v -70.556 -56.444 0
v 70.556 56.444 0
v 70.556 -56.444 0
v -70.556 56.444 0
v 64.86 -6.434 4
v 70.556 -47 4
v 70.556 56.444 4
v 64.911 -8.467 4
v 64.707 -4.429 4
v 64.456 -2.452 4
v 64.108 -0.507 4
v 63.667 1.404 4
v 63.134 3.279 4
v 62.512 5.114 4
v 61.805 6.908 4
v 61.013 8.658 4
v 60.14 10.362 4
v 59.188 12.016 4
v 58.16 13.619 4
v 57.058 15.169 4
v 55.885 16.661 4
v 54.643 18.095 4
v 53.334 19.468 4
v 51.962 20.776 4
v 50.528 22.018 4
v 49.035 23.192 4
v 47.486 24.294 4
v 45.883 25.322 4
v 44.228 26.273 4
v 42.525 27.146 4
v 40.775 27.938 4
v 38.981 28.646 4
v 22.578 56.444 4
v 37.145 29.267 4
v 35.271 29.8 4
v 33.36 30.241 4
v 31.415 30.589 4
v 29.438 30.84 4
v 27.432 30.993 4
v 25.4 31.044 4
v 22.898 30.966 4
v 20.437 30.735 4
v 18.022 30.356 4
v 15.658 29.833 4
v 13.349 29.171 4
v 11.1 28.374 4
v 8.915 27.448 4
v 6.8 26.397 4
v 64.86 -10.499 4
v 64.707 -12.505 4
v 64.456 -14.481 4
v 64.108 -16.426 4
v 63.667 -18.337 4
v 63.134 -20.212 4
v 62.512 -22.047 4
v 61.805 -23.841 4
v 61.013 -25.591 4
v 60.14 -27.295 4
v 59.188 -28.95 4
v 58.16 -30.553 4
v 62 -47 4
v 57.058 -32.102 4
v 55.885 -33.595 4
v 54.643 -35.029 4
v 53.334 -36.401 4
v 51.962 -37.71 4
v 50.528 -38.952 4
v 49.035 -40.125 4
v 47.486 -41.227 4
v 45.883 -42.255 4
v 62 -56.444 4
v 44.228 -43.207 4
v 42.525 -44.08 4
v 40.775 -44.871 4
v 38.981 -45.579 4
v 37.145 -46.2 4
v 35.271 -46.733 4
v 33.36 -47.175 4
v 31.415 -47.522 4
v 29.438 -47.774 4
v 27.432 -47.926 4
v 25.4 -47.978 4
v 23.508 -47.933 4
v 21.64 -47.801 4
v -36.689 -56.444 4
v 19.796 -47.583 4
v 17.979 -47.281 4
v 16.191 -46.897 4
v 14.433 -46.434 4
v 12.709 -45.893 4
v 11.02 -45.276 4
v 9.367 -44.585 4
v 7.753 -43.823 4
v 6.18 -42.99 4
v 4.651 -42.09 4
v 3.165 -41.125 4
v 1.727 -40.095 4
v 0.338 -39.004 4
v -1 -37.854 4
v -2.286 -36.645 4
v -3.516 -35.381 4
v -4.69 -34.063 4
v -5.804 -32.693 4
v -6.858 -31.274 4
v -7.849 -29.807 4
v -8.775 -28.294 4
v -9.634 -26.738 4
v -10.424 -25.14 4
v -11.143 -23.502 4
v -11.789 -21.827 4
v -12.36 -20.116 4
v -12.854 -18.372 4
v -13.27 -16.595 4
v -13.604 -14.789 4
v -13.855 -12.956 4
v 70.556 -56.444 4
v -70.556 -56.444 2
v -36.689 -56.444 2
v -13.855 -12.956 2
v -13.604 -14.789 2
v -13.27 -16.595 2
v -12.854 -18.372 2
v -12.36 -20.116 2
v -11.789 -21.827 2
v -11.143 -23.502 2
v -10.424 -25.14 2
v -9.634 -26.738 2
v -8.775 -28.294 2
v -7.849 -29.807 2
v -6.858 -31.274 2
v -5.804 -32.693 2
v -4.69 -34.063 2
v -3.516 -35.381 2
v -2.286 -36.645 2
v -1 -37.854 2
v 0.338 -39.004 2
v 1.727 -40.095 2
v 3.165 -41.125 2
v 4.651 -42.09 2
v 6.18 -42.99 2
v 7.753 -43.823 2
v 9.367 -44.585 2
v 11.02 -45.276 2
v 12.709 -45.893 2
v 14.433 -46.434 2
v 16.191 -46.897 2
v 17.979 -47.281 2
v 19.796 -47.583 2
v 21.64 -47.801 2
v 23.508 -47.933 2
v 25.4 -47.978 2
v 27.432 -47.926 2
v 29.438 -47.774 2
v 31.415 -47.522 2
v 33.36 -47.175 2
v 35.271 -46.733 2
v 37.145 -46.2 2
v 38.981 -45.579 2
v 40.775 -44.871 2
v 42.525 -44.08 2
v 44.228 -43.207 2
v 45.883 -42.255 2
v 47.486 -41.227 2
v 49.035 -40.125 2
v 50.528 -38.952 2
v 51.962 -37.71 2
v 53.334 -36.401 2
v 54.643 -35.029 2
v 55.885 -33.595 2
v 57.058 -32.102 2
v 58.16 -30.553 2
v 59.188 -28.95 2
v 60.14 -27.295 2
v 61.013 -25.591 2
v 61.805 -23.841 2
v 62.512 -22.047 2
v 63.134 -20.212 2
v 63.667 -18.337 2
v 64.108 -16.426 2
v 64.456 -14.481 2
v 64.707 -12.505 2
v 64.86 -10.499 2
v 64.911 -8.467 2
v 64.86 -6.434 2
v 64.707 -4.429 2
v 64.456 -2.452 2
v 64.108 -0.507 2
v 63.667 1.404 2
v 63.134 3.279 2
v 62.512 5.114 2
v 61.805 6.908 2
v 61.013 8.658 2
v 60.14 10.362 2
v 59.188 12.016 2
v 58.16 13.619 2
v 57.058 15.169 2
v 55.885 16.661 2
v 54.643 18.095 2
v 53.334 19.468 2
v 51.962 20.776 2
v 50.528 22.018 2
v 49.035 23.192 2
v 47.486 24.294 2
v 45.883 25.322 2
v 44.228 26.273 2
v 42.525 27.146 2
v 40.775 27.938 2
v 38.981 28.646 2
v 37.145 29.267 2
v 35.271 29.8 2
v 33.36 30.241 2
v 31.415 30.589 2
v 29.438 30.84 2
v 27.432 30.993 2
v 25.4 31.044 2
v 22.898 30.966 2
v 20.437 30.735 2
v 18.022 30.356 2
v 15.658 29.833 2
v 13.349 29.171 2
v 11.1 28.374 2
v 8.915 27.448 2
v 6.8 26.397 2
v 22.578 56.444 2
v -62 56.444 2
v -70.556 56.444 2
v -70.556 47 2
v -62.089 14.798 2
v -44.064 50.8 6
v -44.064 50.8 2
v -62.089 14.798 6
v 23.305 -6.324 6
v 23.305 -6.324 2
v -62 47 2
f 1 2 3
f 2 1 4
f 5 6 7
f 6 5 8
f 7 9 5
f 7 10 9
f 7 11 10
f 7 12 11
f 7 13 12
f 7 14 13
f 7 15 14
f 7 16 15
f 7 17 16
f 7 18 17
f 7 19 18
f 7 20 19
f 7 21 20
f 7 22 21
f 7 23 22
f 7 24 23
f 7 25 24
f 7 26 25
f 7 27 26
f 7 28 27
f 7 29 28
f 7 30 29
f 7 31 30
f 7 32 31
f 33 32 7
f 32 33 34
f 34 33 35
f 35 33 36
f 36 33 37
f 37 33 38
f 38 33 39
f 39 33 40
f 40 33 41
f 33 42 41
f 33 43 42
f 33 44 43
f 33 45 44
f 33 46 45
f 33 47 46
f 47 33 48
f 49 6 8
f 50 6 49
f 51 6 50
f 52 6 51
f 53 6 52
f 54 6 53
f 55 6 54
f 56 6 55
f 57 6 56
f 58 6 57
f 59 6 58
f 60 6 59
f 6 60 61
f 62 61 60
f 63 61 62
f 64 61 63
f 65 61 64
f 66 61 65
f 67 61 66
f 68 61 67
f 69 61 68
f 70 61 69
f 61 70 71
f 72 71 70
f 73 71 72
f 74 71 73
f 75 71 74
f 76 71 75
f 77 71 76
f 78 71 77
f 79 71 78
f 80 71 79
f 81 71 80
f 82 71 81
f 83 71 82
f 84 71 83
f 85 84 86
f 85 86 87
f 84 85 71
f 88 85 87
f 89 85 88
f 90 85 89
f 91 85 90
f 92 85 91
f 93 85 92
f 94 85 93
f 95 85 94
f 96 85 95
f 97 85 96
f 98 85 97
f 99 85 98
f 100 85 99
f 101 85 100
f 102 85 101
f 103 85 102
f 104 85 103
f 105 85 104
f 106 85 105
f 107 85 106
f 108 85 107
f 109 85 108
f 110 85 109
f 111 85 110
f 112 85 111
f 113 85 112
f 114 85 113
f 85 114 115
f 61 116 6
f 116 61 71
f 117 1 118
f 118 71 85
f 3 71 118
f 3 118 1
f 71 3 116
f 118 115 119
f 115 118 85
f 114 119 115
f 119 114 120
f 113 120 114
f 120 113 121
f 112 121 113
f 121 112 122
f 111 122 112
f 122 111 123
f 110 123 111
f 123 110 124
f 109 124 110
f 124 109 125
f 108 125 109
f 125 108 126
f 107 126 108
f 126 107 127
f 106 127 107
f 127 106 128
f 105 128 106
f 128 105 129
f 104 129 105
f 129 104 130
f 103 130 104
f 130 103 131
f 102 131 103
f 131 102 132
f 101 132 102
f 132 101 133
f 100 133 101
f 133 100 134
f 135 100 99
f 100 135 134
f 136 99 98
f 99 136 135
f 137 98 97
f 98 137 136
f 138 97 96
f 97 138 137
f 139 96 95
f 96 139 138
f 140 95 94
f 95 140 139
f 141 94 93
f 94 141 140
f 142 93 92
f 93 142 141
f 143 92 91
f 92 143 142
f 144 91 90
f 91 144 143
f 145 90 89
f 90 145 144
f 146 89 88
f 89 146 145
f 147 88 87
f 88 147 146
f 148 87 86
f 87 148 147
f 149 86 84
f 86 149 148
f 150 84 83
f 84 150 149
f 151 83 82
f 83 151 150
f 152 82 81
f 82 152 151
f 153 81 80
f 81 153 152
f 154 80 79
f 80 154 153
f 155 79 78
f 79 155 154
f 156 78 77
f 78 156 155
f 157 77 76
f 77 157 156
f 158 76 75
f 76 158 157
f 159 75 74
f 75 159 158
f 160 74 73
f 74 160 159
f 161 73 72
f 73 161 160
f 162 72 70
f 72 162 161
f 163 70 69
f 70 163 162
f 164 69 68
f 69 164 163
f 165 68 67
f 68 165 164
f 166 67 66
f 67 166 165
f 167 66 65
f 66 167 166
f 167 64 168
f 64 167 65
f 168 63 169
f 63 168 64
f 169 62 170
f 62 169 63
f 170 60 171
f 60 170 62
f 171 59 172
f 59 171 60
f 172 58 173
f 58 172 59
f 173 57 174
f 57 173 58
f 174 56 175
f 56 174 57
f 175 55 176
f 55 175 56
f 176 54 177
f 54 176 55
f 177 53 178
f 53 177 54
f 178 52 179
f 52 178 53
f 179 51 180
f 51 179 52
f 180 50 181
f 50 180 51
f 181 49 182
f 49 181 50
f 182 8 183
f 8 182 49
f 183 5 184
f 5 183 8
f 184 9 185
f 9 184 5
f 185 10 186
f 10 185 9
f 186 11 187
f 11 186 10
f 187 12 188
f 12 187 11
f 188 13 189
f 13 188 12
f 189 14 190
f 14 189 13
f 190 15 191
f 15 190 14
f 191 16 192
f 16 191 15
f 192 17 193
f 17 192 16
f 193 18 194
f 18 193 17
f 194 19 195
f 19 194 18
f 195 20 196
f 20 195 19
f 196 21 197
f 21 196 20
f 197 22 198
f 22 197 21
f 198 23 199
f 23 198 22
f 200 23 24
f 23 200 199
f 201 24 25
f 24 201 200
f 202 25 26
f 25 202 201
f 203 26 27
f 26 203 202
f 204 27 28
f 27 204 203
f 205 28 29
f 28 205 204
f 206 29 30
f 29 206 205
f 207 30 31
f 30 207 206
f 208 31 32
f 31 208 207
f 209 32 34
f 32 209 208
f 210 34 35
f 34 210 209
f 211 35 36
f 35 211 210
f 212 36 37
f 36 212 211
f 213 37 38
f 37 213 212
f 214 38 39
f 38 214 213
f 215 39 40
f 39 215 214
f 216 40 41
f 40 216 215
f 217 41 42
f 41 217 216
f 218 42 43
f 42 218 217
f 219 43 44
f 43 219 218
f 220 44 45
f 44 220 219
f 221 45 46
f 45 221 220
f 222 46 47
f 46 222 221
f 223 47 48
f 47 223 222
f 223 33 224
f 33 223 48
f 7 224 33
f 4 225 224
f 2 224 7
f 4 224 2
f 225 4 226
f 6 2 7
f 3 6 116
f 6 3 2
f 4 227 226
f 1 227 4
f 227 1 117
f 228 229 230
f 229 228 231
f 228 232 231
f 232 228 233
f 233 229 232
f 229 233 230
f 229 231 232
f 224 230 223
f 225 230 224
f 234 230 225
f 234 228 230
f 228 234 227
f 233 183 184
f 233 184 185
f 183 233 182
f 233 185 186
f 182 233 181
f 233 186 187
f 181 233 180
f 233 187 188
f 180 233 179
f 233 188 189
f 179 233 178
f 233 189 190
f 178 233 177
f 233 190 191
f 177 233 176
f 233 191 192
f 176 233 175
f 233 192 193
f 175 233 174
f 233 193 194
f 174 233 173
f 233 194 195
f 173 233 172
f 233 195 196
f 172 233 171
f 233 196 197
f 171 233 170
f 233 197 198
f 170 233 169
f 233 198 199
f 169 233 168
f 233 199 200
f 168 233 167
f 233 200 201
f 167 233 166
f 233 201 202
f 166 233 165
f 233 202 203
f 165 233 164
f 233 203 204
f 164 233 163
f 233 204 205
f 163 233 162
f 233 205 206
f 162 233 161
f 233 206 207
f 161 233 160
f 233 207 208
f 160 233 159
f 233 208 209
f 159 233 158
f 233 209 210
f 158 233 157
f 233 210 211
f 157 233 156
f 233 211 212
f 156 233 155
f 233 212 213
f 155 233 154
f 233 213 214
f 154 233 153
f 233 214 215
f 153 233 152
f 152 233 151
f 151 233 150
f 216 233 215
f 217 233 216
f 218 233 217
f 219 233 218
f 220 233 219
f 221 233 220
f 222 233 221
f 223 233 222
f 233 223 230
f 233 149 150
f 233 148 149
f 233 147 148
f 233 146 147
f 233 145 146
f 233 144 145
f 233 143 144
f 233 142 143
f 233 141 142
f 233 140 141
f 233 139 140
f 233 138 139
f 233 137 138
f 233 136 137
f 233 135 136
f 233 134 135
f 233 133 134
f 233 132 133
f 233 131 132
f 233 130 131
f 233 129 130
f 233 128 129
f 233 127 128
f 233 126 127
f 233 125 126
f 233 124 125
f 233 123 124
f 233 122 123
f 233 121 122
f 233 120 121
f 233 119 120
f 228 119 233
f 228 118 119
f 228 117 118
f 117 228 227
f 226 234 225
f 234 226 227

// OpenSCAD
module base()
{
    
// Module names are of the form poly_<inkscape-path-id>().
// As a result you can associate a polygon in this OpenSCAD program with the
//  corresponding SVG element in the Inkscape document by looking for 
//  the XML element with the attribute id="inkscape-path-id".

// Paths have their own variables so they can be imported and used 
//  in polygon(points) structures in other programs.
// The NN_points is the list of all polygon XY vertices. 
// There may be an NN_paths variable as well. If it exists then it 
//  defines the nested paths. Both must be used in the 
//  polygon(points, paths) variant of the command.

profile_scale = 25.4/90; //made in inkscape in mm

// helper functions to determine the X,Y dimensions of the profiles
function min_x(shape_points) = min([ for (x = shape_points) min(x[0])]);
function max_x(shape_points) = max([ for (x = shape_points) max(x[0])]);
function min_y(shape_points) = min([ for (x = shape_points) min(x[1])]);
function max_y(shape_points) = max([ for (x = shape_points) max(x[1])]);

height = 2;
width = 1.0;


rect2162_0_points = [[-250.000000,-200.000000],[250.000000,-200.000000],[250.000000,200.000000],[-250.000000,200.000000],[-250.000000,-200.000000]];

module poly_rect2162(h, w, res=4)  {
  scale([profile_scale, -profile_scale, 1])
  union()  {
    linear_extrude(height=h)
      polygon(rect2162_0_points);
  }
}

// The shapes
poly_rect2162(height, width);
}



module right()
{
   

// Module names are of the form poly_<inkscape-path-id>().
// As a result you can associate a polygon in this OpenSCAD program with the
//  corresponding SVG element in the Inkscape document by looking for 
//  the XML element with the attribute id="inkscape-path-id".

// Paths have their own variables so they can be imported and used 
//  in polygon(points) structures in other programs.
// The NN_points is the list of all polygon XY vertices. 
// There may be an NN_paths variable as well. If it exists then it 
//  defines the nested paths. Both must be used in the 
//  polygon(points, paths) variant of the command.

profile_scale = 25.4/90; //made in inkscape in mm

// helper functions to determine the X,Y dimensions of the profiles
function min_x(shape_points) = min([ for (x = shape_points) min(x[0])]);
function max_x(shape_points) = max([ for (x = shape_points) max(x[0])]);
function min_y(shape_points) = min([ for (x = shape_points) min(x[1])]);
function max_y(shape_points) = max([ for (x = shape_points) max(x[1])]);

height = 4;
width = 1.0;


path3192_0_points = [[80.000000,-200.000000],[24.093750,-93.531250],[31.588654,-97.256080],[39.329082,-100.537912],[47.298468,-103.360211],[55.480249,-105.706443],[63.857857,-107.560072],[72.414729,-108.904564],[81.134298,-109.723385],[90.000000,-110.000000],[97.200874,-109.817720],[104.307617,-109.276758],[111.311411,-108.385933],[118.203437,-107.154062],[124.974878,-105.589966],[131.616914,-103.702461],[138.120728,-101.500366],[144.477500,-98.992500],[150.678413,-96.187681],[156.714648,-93.094727],[162.577388,-89.722456],[168.257812,-86.079688],[173.747104,-82.175239],[179.036445,-78.017930],[184.117017,-73.616577],[188.980000,-68.980000],[193.616577,-64.117017],[198.017930,-59.036445],[202.175239,-53.747104],[206.079687,-48.257812],[209.722456,-42.577388],[213.094727,-36.714648],[216.187681,-30.678413],[218.992500,-24.477500],[221.500366,-18.120728],[223.702461,-11.616914],[225.589966,-4.974878],[227.154063,1.796563],[228.385933,8.688589],[229.276758,15.692383],[229.817720,22.799126],[230.000000,30.000000],[229.817720,37.200874],[229.276758,44.307617],[228.385933,51.311411],[227.154063,58.203437],[225.589966,64.974878],[223.702461,71.616914],[221.500366,78.120728],[218.992500,84.477500],[216.187681,90.678413],[213.094727,96.714648],[209.722456,102.577388],[206.079687,108.257812],[202.175239,113.747104],[198.017930,119.036445],[193.616577,124.117017],[188.980000,128.980000],[184.117017,133.616577],[179.036445,138.017930],[173.747104,142.175239],[168.257812,146.079687],[162.577388,149.722456],[156.714648,153.094727],[150.678413,156.187681],[144.477500,158.992500],[138.120728,161.500366],[131.616914,163.702461],[124.974878,165.589966],[118.203437,167.154063],[111.311411,168.385933],[104.307617,169.276758],[97.200874,169.817720],[90.000000,170.000000],[83.297507,169.842111],[76.676022,169.373180],[70.142643,168.600310],[63.704468,167.530606],[57.368595,166.171172],[51.142121,164.529111],[45.032146,162.611528],[39.045766,160.425527],[33.190080,157.978211],[27.472186,155.276684],[21.899182,152.328051],[16.478166,149.139415],[11.216236,145.717881],[6.120490,142.070551],[1.198025,138.204532],[-3.544059,134.126925],[-8.098665,129.844836],[-12.458695,125.365367],[-16.617051,120.695624],[-20.566635,115.842710],[-24.300350,110.813729],[-27.811096,105.615785],[-31.091776,100.255982],[-34.135291,94.741423],[-36.934545,89.079214],[-39.482439,83.276458],[-41.771874,77.340258],[-43.795754,71.277719],[-45.546979,65.095945],[-47.018452,58.802039],[-48.203075,52.403106],[-49.093750,45.906250],[-130.000000,200.000000],[250.000000,200.000000],[250.000000,-200.000000],[80.000000,-200.000000],[80.000000,-200.000000]];

module poly_path3192(h, w, res=4)  {
  scale([profile_scale, -profile_scale, 1])
  union()  {
    linear_extrude(height=h)
      polygon(path3192_0_points);
  }
}

rect817_0_points = [[-250.000000,-200.000000],[-224.532171,-200.000000],[-224.532171,-181.423466],[-250.000000,-181.423466],[-250.000000,-200.000000]];

module poly_rect817(h, w, res=4)  {
  scale([profile_scale, -profile_scale, 1])
  union()  {
    linear_extrude(height=h)
      polygon(rect817_0_points);
  }
}

path3199_0_points = [[-156.130883,-180.000000],[-220.000000,-52.433550],[82.578370,22.409090],[-156.130883,-180.000000],[-156.130883,-180.000000]];

module poly_path3199(h, w, res=4)  {
  scale([profile_scale, -profile_scale, 1])
  union()  {
    linear_extrude(height=h)
      polygon(path3199_0_points);
  }
}

// The shapes
poly_path3192(height, width);
poly_rect817(height, width);
poly_path3199(height, width);

}


module left()
{
    

// Module names are of the form poly_<inkscape-path-id>().
// As a result you can associate a polygon in this OpenSCAD program with the
//  corresponding SVG element in the Inkscape document by looking for 
//  the XML element with the attribute id="inkscape-path-id".

// Paths have their own variables so they can be imported and used 
//  in polygon(points) structures in other programs.
// The NN_points is the list of all polygon XY vertices. 
// There may be an NN_paths variable as well. If it exists then it 
//  defines the nested paths. Both must be used in the 
//  polygon(points, paths) variant of the command.

profile_scale = 25.4/90; //made in inkscape in mm

// helper functions to determine the X,Y dimensions of the profiles
function min_x(shape_points) = min([ for (x = shape_points) min(x[0])]);
function max_x(shape_points) = max([ for (x = shape_points) max(x[0])]);
function min_y(shape_points) = min([ for (x = shape_points) min(x[1])]);
function max_y(shape_points) = max([ for (x = shape_points) max(x[1])]);

height = 6;
width = 1.0;


path3199_0_points = [[-156.130890,-180.000000],[-220.000007,-52.433550],[82.578363,22.409089],[-156.130890,-180.000000],[-156.130890,-180.000000]];

module poly_path3199(h, w, res=4)  {
  scale([profile_scale, -profile_scale, 1])
  union()  {
    linear_extrude(height=h)
      polygon(path3199_0_points);
  }
}

rect819_0_points = [[230.892543,185.917790],[250.000007,185.917790],[250.000007,200.000000],[230.892543,200.000000],[230.892543,185.917790]];

module poly_rect819(h, w, res=4)  {
  scale([profile_scale, -profile_scale, 1])
  union()  {
    linear_extrude(height=h)
      polygon(rect819_0_points);
  }
}

rect817_0_points = [[-250.000007,-200.000000],[-224.532178,-200.000000],[-224.532178,-181.423466],[-250.000007,-181.423466],[-250.000007,-200.000000]];

module poly_rect817(h, w, res=4)  {
  scale([profile_scale, -profile_scale, 1])
  union()  {
    linear_extrude(height=h)
      polygon(rect817_0_points);
  }
}

// The shapes
poly_path3199(height, width);
poly_rect819(height, width);
poly_rect817(height, width);

}

module logo()
{
    difference()
    {
        union()
        {
            color("gray") base();
            color([0.2,0.2,0.2]) right();
            color("red") left();
        }
        
        translate([-72,47,2]) cube([10,10,10]);
        translate([62,-57,4]) cube([10,10,10]);
        
    }
}

logo();
